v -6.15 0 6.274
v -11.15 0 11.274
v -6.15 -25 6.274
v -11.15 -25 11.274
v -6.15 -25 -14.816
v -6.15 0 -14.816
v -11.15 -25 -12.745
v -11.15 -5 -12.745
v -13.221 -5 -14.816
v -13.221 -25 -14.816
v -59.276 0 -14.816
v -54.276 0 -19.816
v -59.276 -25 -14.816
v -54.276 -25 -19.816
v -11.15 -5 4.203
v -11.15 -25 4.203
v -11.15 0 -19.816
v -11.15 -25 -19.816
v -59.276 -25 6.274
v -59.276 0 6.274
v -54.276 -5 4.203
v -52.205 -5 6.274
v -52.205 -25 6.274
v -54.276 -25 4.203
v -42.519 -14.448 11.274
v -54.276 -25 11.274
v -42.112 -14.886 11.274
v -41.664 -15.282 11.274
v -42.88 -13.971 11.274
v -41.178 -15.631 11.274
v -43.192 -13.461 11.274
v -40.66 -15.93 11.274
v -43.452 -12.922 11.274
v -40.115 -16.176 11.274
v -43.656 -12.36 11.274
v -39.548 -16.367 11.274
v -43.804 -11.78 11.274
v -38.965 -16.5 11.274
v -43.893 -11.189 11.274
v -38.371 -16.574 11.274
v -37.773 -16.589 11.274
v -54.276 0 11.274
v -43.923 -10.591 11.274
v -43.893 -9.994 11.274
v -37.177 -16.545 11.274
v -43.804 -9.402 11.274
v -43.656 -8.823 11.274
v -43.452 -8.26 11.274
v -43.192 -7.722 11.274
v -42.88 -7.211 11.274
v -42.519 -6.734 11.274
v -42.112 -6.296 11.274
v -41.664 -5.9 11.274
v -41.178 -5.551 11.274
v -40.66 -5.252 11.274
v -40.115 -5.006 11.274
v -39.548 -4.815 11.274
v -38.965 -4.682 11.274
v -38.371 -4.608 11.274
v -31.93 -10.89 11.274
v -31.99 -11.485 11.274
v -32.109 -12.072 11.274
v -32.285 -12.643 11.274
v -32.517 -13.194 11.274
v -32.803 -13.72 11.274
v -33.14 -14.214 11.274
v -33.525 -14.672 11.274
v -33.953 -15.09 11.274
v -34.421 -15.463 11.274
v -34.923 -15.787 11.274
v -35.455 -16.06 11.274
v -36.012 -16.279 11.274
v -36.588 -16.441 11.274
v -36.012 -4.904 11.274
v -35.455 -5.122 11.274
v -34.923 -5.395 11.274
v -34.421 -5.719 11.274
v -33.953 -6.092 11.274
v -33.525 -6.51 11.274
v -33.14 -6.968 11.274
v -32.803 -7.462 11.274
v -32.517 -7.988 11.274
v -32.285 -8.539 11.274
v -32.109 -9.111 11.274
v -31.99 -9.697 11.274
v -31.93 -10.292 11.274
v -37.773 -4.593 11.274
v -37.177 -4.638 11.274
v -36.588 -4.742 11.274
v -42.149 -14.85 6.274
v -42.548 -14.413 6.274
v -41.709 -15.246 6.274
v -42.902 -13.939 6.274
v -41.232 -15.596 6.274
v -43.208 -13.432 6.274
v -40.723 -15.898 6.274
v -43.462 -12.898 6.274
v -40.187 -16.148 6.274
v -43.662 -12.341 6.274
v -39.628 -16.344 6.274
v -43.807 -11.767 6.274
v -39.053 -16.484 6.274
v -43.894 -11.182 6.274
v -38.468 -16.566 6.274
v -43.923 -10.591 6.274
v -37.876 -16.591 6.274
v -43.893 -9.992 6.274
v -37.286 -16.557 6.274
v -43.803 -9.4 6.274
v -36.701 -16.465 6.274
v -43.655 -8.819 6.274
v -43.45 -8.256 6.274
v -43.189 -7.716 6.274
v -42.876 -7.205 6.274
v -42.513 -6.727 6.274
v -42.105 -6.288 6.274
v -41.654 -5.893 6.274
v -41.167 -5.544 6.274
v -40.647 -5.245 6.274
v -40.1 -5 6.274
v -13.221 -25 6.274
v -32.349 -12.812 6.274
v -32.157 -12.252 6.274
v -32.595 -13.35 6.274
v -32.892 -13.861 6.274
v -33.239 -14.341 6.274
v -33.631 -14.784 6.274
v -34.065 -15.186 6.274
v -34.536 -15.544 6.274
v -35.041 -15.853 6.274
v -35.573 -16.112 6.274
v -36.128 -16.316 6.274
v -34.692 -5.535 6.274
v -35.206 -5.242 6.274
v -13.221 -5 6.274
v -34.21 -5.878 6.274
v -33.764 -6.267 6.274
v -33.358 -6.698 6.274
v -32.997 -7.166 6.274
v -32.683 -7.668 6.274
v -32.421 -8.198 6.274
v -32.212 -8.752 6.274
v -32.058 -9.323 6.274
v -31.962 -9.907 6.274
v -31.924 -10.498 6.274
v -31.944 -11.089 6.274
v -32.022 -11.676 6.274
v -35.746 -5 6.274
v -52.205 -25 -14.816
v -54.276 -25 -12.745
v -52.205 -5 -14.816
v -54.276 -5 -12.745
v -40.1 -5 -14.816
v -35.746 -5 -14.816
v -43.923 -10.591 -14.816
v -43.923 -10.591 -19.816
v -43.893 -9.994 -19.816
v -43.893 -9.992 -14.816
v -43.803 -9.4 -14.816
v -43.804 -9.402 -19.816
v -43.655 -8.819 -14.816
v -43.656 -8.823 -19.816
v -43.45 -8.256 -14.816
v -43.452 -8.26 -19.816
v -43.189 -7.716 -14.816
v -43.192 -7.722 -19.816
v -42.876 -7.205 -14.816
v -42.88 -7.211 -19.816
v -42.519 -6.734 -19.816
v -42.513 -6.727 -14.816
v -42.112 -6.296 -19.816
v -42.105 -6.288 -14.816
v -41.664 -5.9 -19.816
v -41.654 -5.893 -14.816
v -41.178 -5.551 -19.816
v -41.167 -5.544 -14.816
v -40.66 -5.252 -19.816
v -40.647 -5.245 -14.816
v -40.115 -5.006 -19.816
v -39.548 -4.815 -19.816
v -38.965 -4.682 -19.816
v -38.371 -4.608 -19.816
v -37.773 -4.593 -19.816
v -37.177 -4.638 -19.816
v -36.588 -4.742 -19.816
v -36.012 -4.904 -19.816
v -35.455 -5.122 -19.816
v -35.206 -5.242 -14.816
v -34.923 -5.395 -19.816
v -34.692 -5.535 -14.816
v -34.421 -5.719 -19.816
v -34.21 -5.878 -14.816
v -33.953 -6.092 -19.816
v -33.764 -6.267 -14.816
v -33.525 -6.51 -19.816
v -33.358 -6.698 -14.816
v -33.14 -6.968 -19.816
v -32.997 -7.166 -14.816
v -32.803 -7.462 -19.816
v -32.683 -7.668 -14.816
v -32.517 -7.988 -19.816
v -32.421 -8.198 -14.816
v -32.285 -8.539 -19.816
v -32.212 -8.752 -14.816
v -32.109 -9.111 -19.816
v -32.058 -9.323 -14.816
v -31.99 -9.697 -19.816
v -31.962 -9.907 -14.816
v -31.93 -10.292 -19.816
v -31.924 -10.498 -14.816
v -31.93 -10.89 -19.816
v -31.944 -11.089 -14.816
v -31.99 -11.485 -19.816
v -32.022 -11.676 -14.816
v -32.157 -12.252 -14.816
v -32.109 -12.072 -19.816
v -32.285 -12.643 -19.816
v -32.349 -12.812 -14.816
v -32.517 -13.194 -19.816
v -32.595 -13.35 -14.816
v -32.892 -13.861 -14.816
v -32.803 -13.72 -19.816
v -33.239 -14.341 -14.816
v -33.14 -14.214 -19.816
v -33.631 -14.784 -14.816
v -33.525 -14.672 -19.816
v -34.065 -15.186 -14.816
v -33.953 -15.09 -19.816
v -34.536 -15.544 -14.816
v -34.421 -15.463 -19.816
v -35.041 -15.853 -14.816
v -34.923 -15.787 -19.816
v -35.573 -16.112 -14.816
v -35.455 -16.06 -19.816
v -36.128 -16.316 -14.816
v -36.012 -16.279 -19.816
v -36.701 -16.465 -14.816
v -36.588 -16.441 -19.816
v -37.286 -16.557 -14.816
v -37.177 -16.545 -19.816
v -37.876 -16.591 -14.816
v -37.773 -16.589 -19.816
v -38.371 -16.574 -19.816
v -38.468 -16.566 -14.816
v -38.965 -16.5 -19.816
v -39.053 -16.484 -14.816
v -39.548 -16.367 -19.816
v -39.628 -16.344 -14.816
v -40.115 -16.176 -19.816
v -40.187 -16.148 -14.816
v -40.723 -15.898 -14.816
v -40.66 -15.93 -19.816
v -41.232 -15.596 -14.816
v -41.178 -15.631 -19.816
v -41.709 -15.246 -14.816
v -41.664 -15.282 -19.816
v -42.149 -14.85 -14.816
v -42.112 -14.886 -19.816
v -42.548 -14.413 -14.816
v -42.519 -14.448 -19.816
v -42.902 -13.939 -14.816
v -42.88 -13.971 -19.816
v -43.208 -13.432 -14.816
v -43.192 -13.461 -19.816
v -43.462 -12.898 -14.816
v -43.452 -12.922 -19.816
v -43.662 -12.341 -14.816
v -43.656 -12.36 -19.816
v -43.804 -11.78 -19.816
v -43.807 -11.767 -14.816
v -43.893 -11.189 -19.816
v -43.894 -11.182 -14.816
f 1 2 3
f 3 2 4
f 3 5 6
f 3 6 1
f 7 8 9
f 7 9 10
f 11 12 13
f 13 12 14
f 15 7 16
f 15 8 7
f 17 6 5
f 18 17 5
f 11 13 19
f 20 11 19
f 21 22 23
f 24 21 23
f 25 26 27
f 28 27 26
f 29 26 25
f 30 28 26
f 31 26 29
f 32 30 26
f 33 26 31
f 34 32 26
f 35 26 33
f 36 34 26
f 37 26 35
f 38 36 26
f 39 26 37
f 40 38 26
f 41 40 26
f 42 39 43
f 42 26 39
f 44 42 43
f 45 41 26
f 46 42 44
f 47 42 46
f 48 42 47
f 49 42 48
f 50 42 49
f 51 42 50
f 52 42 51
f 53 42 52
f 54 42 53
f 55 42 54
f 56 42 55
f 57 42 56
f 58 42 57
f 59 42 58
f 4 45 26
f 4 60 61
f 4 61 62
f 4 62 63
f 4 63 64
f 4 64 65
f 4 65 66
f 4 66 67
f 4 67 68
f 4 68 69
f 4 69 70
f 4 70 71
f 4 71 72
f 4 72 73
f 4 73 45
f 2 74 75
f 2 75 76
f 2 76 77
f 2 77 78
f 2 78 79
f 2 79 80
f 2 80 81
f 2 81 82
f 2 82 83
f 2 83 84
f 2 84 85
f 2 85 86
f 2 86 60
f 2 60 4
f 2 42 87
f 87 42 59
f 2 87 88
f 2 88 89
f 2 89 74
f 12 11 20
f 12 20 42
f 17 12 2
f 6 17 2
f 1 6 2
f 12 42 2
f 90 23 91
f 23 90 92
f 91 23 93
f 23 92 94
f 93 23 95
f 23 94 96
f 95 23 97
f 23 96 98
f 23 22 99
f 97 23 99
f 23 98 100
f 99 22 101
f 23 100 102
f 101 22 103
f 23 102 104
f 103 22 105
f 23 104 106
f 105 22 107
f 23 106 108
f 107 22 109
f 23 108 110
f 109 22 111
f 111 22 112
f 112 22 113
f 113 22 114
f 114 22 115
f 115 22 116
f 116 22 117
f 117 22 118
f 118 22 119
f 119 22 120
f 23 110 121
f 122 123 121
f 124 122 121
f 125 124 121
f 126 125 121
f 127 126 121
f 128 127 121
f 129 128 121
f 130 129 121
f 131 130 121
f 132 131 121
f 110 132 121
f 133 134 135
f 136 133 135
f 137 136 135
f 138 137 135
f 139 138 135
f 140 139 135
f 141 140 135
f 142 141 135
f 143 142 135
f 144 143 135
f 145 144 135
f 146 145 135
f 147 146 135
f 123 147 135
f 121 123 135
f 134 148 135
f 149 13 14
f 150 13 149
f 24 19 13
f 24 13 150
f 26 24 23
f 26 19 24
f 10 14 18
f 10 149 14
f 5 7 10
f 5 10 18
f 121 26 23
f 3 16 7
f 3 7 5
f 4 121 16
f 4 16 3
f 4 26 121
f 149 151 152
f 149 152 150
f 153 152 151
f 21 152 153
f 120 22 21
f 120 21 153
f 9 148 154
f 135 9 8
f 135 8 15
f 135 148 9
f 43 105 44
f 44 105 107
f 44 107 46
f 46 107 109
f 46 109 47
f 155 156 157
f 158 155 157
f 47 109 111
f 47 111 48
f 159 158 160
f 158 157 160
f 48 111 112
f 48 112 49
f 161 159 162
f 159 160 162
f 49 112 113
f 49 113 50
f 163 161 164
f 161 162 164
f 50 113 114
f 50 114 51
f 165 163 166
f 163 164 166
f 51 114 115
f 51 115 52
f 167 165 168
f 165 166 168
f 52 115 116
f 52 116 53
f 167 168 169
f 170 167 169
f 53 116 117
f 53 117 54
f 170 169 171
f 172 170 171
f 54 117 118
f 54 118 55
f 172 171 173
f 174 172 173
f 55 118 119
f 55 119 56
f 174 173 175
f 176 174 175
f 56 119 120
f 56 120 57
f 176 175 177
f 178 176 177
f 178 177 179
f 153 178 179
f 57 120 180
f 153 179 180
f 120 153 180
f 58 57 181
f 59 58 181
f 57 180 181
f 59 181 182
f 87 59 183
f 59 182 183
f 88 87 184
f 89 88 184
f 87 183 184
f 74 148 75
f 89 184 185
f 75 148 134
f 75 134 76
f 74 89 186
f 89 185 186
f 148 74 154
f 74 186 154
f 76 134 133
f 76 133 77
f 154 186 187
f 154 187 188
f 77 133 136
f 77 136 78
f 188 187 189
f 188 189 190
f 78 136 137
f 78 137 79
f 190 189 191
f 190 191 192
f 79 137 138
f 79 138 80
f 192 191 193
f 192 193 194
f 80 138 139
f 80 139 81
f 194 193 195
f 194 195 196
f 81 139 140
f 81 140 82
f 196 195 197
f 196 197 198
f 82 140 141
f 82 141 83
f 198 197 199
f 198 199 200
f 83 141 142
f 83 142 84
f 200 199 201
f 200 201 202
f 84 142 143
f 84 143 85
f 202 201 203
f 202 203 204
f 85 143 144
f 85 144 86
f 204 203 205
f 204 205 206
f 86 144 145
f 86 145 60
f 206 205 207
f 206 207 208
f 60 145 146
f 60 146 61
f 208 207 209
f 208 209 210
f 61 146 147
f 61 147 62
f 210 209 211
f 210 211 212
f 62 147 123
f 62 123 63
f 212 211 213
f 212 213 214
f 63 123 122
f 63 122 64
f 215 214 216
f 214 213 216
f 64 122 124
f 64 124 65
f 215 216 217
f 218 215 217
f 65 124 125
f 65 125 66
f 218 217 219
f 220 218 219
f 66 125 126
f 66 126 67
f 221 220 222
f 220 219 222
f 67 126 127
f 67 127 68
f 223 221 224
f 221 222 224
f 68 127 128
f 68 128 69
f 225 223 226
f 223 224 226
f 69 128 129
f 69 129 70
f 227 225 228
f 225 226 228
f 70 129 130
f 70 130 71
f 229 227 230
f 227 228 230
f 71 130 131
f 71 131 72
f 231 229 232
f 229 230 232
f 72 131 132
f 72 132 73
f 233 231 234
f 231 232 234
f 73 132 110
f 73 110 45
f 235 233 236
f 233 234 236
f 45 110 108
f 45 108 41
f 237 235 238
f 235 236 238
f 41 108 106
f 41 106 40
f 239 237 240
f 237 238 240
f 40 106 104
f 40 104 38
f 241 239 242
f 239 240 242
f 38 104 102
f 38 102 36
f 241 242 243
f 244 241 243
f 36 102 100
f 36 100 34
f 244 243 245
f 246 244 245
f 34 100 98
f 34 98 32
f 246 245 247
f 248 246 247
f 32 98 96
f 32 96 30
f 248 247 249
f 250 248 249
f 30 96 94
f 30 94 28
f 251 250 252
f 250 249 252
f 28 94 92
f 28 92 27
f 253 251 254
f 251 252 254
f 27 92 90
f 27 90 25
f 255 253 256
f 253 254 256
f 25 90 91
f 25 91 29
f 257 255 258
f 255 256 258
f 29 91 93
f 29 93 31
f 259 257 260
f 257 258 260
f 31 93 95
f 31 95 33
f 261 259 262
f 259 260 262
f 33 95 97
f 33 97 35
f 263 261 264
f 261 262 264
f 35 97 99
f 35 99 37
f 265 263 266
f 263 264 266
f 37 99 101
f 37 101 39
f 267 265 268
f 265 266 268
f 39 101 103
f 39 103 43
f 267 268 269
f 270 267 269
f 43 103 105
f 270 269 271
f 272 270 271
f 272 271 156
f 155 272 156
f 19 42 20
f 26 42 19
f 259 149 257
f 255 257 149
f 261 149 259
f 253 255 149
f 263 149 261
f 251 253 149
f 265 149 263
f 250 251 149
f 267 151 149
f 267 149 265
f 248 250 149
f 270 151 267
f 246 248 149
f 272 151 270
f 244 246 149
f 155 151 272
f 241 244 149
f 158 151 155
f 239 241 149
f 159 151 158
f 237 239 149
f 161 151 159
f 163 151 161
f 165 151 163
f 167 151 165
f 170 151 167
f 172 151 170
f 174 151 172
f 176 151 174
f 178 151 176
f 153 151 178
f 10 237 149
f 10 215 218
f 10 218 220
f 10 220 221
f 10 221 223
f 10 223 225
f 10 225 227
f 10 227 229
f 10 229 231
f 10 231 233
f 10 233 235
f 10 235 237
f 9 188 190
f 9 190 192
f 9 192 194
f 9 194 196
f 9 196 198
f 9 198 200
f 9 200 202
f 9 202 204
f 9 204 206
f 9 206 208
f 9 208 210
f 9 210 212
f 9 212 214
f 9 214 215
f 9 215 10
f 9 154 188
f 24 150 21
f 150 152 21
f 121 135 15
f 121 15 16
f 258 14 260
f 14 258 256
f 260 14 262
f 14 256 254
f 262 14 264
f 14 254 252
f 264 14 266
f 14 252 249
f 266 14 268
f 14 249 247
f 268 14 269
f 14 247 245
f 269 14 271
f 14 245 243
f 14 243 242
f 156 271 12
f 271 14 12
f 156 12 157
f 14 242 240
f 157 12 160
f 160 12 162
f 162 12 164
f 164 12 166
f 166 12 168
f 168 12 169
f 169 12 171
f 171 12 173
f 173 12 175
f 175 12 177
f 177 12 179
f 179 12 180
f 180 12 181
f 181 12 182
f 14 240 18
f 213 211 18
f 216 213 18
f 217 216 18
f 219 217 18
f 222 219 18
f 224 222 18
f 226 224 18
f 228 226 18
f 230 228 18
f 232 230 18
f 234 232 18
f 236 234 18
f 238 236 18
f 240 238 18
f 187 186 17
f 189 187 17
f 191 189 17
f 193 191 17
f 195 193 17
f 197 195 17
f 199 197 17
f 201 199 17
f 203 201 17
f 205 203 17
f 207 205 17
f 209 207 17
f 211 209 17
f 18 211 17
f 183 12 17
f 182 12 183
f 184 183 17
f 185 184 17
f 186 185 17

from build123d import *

# Parameters (mm, degrees)
F0_W     = 53.126359
F0_H     = 31.090025
F1_DEPTH = 25
F2_SIZE  = 5
F3_T     = -5
F5_D     = 12


with BuildPart() as f1:
    # F0 (on Front) → F1 (new body)
    with BuildSketch(Plane.XZ):
        with Locations((-32.712854, -4.270607)):
            Rectangle(F0_W, F0_H)
    extrude(amount=F1_DEPTH)

    # F2
    f2_edges = [f1.edges().sort_by_distance(p)[0] for p in [
        (-6.149674, -12.5, 11.274405),
        (-59.276033, -12.5, 11.274405),
        (-6.149674, -12.5, -19.81562),
        (-59.276033, -12.5, -19.81562),
    ]]
    chamfer(f2_edges, length=F2_SIZE)

    # F3
    f3_openings = [f1.faces().sort_by_distance(p)[0] for p in [
        (-32.712854, -25, -4.270608),
    ]]
    offset(amount=F3_T, openings=f3_openings)

    # F5 (through all)
    with Locations(Plane.XY.offset(11.274405)):
        with Locations((-37.922993, -10.591106)):
            Hole(F5_D / 2)


solid = f1.part
